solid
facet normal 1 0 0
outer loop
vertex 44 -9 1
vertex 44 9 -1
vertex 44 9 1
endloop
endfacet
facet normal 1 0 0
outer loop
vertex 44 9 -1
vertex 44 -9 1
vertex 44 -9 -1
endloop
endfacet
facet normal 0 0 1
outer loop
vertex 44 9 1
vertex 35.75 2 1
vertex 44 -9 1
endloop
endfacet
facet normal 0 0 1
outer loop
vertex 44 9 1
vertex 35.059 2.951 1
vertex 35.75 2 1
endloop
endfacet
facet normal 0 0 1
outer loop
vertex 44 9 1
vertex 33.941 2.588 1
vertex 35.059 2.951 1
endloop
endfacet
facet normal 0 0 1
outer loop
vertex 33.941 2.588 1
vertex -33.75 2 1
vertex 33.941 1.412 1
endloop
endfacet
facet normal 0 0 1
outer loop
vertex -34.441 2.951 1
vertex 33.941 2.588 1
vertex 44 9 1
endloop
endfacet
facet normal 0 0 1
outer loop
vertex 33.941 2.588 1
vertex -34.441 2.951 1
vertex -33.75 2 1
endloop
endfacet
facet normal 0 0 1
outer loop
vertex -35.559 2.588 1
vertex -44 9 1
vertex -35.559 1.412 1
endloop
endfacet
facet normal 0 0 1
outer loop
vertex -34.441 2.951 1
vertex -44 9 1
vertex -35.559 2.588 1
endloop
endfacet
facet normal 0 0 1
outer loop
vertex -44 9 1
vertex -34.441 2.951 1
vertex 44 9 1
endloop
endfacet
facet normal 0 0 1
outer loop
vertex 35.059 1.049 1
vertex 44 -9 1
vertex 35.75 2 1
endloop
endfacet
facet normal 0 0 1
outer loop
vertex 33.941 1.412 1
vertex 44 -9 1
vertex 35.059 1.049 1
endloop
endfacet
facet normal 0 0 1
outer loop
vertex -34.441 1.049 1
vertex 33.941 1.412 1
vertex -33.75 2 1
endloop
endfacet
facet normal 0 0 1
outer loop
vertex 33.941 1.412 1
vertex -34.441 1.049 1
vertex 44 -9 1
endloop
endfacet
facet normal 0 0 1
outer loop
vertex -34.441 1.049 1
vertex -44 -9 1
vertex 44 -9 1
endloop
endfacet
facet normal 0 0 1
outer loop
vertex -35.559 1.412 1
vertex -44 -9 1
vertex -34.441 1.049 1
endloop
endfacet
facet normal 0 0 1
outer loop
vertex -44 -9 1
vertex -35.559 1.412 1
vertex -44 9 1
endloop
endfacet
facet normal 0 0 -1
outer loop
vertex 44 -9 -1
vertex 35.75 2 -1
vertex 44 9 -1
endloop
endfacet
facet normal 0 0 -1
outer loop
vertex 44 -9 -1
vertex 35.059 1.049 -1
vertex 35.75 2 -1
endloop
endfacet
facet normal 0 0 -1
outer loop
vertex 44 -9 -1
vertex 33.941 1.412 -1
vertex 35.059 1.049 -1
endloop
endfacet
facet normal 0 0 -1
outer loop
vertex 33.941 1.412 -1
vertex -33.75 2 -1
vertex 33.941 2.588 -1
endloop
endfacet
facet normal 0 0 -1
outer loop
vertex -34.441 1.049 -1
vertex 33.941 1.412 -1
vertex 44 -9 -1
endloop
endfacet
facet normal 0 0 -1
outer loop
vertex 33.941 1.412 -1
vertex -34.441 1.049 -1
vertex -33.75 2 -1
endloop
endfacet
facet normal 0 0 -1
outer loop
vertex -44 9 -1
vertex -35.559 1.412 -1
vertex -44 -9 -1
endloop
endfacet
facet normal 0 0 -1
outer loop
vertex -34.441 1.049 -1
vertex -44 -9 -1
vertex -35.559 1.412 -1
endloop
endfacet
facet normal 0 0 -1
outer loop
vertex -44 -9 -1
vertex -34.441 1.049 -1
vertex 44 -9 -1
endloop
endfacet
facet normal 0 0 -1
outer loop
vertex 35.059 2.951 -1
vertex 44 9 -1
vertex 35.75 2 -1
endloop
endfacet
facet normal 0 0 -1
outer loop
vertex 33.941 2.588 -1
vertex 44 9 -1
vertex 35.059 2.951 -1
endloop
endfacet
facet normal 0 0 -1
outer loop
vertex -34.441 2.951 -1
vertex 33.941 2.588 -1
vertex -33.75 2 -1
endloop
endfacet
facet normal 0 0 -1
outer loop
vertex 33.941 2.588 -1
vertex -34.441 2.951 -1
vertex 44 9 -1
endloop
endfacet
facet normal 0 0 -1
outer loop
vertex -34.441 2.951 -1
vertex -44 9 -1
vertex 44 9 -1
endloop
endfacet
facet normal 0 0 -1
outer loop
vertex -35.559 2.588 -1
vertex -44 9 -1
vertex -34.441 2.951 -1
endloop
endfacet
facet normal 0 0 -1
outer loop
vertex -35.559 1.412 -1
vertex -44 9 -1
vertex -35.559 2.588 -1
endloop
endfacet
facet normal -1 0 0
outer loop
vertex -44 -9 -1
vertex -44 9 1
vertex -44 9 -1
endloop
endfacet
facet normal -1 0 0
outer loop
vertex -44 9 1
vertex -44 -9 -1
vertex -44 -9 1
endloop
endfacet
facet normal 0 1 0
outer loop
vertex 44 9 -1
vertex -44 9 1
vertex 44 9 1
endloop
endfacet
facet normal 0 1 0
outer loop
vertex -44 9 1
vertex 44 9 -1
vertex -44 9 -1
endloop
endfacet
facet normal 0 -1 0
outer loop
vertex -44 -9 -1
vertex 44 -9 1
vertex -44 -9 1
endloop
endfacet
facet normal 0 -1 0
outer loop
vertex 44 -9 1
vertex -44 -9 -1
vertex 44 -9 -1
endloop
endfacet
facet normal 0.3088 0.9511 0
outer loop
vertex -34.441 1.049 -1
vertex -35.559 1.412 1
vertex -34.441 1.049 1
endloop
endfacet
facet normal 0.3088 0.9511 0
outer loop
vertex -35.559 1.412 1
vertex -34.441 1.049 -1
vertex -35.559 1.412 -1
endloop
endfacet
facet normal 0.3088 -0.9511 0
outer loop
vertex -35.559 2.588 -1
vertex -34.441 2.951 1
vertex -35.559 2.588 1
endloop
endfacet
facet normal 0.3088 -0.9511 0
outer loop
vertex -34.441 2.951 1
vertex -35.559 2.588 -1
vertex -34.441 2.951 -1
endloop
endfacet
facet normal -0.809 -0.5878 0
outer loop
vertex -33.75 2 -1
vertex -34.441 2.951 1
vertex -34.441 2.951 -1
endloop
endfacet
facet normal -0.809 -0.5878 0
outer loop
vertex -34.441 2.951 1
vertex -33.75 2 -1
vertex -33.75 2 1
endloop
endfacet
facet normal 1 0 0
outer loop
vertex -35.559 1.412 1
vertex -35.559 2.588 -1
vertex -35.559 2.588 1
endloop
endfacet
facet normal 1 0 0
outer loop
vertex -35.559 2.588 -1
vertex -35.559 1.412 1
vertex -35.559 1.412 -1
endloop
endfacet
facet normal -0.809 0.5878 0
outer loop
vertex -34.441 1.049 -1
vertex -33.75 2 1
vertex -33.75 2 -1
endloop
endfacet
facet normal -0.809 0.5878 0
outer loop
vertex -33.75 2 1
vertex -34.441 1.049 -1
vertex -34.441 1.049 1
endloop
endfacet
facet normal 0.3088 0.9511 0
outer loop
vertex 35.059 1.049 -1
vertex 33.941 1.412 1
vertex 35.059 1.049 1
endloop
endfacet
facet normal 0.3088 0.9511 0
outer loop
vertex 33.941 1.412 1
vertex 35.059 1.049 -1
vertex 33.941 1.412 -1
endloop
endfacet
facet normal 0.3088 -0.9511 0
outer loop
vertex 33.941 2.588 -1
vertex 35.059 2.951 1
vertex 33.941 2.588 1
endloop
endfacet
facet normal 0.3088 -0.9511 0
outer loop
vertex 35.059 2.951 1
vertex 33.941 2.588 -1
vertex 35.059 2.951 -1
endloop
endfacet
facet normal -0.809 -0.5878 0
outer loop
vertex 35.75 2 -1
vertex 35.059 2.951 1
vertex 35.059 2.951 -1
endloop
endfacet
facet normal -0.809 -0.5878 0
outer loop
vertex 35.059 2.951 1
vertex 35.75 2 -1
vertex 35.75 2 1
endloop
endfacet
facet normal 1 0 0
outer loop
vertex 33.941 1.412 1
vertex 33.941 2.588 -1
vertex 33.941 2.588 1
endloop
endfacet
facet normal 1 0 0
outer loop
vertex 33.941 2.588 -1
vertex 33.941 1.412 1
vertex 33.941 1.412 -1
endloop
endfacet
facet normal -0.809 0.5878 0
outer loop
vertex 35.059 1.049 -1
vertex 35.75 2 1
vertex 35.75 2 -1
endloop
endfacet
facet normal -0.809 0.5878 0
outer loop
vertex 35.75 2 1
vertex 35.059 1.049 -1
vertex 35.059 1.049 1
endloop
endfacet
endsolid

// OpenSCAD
// Base dimensions
base_width = 18;
base_length = 88;
base_thickness = 2; // Adjust as needed

// Outer hole parameters
outer_hole_diameter = 2; // Diameter with tolerance
outer_hole_spacing = 69.5;
outer_hole_offset_y = 2; // Offset of the outer holes from the base center (y-axis)

// Calculate outer hole center positions
outer_hole1_x = -outer_hole_spacing / 2;
outer_hole2_x = outer_hole_spacing / 2;

// Create the base plate
module base() {
  cube([base_length, base_width, base_thickness], center = true);
}

// Create an outer hole (using cylinder for subtraction)
module outer_hole() {
  // Use a slightly taller cylinder for clean subtraction
  cylinder(d = outer_hole_diameter, h = base_thickness + 1, center = true);
}


difference() {
  // 1. Start with the base
  base();

  // 2. Subtract the main holes
  // Outer holes
  translate([outer_hole1_x, outer_hole_offset_y, 0]) outer_hole();
  translate([outer_hole2_x, outer_hole_offset_y, 0]) outer_hole();
}
